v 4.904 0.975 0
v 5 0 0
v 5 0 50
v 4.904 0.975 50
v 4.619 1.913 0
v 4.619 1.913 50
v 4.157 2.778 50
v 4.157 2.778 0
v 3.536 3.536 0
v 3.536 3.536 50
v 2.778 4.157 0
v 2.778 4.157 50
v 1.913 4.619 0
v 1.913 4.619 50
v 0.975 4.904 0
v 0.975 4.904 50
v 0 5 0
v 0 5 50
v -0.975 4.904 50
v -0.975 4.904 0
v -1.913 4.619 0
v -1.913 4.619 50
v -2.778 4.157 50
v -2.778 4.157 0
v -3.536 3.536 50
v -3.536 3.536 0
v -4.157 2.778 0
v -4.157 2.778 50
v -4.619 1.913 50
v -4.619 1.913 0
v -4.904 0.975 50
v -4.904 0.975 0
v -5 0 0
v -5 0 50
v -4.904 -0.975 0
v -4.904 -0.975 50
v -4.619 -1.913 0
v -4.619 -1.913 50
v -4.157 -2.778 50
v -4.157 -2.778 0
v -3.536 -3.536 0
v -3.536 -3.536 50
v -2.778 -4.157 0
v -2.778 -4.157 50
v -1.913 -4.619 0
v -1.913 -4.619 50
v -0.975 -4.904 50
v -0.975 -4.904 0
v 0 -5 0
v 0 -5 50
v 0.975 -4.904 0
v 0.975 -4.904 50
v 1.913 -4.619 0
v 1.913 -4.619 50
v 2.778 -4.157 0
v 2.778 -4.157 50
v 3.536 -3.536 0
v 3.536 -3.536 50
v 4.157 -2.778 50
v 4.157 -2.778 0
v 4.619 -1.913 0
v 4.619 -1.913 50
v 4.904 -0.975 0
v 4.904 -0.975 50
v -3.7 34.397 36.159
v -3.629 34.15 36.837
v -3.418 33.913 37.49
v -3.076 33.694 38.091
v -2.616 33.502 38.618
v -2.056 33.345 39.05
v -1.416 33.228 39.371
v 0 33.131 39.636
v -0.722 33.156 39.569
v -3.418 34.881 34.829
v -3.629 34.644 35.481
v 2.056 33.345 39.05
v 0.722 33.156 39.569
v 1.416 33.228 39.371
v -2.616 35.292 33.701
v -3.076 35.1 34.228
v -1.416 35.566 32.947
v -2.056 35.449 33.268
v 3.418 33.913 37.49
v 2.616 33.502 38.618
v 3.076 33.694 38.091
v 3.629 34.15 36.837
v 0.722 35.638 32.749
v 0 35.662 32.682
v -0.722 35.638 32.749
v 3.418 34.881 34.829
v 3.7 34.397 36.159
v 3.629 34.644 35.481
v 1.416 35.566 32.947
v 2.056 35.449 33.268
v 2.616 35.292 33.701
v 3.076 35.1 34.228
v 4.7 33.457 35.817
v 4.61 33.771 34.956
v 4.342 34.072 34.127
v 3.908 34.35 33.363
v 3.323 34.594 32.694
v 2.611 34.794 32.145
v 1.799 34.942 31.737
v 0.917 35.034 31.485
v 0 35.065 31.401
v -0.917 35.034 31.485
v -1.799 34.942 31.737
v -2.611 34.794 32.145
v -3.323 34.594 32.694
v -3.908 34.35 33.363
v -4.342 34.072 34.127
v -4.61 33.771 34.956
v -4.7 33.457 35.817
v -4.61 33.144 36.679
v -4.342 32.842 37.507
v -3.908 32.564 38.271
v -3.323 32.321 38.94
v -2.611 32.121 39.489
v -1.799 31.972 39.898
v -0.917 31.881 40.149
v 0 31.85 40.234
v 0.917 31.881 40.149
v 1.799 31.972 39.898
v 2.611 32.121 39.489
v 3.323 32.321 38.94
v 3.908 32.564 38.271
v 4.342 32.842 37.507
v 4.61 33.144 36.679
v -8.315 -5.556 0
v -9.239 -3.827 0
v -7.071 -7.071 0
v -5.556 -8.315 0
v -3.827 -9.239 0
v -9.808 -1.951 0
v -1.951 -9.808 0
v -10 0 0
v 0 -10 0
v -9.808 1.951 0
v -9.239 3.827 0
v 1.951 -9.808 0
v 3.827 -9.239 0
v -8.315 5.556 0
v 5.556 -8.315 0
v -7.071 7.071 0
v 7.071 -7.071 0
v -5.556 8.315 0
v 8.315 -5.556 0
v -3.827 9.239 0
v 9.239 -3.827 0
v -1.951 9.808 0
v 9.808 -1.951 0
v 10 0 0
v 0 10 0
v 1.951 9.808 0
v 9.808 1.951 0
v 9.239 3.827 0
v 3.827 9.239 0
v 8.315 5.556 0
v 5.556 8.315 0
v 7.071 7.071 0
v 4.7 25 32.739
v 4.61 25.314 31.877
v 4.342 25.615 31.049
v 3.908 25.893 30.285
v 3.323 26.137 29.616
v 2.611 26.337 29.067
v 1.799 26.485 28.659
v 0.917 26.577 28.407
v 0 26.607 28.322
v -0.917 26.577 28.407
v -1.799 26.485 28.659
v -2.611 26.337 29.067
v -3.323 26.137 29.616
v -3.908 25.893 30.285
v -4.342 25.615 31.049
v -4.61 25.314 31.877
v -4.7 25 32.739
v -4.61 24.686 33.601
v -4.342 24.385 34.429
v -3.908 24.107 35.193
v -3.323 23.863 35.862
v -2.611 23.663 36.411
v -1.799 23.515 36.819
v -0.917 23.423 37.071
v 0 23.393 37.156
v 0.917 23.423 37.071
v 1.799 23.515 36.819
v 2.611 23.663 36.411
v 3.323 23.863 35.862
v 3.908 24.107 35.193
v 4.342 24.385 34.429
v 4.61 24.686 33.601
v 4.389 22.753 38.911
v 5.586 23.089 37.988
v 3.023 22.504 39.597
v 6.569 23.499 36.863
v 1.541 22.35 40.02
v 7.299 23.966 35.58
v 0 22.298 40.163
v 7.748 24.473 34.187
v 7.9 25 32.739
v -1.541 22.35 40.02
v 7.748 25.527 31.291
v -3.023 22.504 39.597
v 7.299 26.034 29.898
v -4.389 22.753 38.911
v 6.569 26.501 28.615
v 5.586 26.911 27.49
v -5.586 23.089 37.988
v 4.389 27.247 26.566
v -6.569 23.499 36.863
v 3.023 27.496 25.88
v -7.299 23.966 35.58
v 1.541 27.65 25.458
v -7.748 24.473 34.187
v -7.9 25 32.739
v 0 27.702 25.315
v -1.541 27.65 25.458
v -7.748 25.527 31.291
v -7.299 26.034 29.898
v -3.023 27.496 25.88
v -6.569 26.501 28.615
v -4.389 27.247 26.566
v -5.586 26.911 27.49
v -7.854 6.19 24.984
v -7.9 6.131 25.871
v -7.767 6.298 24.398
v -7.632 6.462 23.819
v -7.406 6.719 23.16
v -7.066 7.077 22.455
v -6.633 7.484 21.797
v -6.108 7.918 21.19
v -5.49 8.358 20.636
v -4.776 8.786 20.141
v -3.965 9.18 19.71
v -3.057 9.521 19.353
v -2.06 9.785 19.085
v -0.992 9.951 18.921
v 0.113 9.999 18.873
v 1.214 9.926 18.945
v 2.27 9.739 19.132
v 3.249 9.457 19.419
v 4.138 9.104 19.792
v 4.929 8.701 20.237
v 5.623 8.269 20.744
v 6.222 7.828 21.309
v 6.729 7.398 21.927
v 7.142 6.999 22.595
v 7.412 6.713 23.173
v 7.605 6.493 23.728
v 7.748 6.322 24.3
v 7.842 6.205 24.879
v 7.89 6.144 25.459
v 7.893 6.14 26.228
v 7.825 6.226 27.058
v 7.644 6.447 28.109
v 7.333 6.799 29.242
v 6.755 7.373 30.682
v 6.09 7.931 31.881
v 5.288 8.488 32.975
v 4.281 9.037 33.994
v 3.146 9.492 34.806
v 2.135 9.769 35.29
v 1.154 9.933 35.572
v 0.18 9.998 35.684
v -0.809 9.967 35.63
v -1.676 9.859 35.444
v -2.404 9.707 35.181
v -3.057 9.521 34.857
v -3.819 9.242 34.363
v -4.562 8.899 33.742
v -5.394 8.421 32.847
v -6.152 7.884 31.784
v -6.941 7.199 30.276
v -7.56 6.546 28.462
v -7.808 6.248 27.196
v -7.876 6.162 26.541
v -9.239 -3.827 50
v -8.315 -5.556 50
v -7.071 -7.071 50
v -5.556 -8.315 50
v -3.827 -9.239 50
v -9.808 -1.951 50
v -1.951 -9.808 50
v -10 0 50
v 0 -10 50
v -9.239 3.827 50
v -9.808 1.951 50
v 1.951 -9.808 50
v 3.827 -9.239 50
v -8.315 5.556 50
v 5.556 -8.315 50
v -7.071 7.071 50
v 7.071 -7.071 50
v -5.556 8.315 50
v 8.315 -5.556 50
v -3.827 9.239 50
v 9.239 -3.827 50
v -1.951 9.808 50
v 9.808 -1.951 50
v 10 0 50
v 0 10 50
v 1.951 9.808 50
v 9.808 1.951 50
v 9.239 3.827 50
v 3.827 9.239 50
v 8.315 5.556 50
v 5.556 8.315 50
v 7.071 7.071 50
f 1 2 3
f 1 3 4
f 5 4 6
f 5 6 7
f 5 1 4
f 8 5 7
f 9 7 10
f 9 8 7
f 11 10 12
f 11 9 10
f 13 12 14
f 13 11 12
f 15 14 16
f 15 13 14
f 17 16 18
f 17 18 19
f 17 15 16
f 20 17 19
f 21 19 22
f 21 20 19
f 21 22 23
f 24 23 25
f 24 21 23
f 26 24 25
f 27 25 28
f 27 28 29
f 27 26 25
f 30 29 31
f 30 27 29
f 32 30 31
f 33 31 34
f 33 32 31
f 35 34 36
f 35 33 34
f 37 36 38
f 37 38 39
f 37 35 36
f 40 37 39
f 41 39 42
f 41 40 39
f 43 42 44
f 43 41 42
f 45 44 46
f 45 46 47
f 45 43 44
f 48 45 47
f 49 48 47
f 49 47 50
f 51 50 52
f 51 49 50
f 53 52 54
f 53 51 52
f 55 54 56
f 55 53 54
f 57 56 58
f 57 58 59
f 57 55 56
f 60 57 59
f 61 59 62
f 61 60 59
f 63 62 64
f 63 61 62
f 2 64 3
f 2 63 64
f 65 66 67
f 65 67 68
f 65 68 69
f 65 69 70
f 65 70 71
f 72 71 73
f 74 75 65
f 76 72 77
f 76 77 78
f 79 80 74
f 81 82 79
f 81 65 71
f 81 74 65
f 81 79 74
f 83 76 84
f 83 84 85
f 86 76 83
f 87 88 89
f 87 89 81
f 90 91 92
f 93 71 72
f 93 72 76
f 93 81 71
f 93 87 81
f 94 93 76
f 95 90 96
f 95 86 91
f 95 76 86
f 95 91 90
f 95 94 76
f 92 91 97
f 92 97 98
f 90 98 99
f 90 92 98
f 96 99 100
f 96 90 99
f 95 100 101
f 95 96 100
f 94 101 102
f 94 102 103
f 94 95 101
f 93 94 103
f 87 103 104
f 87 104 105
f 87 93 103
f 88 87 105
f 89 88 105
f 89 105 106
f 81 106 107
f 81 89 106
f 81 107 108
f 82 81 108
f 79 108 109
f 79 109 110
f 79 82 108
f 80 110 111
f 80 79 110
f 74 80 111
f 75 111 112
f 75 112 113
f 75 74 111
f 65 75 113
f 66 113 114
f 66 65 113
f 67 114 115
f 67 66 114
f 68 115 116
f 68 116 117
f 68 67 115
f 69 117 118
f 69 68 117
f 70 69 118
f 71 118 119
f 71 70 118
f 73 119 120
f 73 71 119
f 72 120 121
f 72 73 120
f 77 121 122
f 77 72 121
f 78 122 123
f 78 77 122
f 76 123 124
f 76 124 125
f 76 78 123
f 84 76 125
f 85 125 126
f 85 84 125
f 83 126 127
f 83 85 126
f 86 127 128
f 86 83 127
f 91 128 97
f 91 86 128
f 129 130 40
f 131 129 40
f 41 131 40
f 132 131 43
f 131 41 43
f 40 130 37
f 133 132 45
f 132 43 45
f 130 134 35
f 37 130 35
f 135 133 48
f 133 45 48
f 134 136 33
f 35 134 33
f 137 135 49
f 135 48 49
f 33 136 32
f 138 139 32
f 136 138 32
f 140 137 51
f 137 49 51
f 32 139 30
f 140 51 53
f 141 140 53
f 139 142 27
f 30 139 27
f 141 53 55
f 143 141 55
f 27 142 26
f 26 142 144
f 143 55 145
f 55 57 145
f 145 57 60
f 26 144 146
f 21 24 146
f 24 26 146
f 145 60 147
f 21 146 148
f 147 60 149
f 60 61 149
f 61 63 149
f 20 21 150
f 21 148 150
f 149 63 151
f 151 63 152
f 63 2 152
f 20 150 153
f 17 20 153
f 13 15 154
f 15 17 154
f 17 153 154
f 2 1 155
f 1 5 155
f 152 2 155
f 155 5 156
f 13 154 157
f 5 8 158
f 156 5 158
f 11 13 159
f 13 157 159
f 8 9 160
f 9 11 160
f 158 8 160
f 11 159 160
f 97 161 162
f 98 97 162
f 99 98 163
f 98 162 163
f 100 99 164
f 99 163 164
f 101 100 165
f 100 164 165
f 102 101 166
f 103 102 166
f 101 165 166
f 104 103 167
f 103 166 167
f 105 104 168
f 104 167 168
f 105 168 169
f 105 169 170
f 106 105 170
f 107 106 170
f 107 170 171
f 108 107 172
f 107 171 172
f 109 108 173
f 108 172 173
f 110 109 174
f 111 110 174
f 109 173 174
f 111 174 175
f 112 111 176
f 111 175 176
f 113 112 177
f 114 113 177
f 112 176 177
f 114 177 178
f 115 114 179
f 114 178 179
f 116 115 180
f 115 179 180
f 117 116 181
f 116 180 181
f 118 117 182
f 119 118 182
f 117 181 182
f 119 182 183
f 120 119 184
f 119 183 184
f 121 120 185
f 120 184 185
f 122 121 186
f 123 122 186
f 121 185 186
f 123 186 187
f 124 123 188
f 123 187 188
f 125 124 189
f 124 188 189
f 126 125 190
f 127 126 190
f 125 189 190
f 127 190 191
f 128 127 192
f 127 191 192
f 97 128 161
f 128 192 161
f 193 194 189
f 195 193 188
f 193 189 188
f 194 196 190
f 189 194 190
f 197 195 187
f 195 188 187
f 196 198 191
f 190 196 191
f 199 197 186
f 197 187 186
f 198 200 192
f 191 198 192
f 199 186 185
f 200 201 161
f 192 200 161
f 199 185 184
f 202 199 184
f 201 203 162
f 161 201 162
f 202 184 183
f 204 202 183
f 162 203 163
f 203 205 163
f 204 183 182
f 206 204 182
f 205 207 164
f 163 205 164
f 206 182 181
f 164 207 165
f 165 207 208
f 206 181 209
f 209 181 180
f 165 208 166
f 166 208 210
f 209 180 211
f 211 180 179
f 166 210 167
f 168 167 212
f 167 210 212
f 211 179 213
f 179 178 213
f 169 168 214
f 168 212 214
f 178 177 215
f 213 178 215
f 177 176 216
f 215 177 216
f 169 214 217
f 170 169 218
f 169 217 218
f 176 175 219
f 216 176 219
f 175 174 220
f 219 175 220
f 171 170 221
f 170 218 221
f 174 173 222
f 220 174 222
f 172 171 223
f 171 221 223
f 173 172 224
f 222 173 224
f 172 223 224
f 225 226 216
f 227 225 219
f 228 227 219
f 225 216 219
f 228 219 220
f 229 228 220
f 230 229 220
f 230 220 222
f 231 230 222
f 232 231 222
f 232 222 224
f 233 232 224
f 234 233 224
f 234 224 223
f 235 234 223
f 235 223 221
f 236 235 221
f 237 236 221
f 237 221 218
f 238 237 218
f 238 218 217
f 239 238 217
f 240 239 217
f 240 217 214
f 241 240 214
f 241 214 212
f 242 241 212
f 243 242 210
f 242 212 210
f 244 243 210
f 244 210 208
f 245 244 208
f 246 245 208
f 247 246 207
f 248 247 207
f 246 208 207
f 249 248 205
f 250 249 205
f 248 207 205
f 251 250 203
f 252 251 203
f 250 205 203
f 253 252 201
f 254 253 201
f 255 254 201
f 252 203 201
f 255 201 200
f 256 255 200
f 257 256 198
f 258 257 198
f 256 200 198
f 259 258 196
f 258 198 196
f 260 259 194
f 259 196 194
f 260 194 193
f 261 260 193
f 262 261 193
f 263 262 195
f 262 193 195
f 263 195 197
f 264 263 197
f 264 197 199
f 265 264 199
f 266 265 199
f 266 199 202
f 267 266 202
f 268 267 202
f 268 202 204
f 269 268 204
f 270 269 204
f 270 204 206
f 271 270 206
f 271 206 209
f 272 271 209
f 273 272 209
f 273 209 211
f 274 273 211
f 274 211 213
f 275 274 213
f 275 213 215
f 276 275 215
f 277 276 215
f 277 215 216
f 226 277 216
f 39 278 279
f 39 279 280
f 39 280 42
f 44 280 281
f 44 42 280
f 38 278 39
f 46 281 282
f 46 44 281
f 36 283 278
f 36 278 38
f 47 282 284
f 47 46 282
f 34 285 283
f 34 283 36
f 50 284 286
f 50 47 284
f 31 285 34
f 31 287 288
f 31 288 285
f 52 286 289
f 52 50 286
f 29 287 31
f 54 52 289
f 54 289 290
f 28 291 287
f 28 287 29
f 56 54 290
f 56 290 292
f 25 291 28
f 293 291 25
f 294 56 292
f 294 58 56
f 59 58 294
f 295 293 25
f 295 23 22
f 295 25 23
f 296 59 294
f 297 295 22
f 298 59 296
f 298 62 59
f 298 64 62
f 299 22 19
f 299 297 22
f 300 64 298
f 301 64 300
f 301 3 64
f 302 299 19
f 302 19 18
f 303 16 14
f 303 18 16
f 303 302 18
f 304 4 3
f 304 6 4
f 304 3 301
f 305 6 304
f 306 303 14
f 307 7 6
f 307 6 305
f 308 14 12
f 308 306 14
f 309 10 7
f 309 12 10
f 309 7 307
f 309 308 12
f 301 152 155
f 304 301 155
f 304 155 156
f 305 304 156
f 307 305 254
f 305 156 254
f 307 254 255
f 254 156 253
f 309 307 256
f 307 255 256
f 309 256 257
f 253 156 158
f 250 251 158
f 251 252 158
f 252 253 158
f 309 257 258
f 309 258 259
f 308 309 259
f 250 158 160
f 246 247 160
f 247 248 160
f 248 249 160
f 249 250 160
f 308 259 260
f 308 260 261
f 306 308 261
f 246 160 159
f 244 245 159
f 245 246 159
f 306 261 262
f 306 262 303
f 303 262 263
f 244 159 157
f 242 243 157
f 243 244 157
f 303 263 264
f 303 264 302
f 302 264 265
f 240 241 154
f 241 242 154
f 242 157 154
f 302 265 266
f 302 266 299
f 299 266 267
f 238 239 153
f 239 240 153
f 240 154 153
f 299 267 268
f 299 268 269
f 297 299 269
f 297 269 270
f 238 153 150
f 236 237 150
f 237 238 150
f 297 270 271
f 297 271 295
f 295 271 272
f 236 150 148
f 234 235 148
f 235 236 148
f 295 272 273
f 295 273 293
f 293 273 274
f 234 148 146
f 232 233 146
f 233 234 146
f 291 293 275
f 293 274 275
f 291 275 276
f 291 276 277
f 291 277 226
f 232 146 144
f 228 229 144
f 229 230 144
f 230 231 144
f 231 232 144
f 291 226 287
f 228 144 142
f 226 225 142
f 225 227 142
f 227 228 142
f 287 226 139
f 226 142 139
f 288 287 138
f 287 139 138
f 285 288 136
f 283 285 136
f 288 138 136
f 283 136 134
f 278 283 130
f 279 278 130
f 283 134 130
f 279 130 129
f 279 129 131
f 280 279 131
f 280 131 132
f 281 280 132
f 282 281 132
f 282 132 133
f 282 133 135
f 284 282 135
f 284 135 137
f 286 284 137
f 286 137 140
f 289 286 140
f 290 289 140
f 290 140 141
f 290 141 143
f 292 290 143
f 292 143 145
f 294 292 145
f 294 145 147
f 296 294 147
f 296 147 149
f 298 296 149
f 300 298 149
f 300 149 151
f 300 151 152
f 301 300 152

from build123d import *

# Parameters (mm, degrees)
SKETCH1_R           = 10
SKETCH1_R_2         = 5
BOSS_EXTRUDE1_DEPTH = 50
BOSS_EXTRUDE2_REACH = 46.087
SKETCH4_R           = 7.9
SKETCH6_R           = 4.7
BOSS_EXTRUDE3_DEPTH = 10
CHAMFER1_SIZE       = 1


with BuildPart() as part:
    # Sketch1 → Boss-Extrude1 (new body)
    with BuildSketch(Plane.XY):
        Circle(SKETCH1_R)
        Circle(SKETCH1_R_2, mode=Mode.SUBTRACT)
    extrude(amount=BOSS_EXTRUDE1_DEPTH)

    # Sketch4 → Boss-Extrude2 (add, up to next)
    with BuildSketch(Plane(origin=(0, 25, 32.738958199), x_dir=(-1, 0, 0), z_dir=(0, -0.939692621, -0.342020143)), mode=Mode.PRIVATE) as boss_extrude2_sk1:
        Circle(SKETCH4_R)
    boss_extrude2_tool1 = extrude(boss_extrude2_sk1.sketch, amount=BOSS_EXTRUDE2_REACH, mode=Mode.PRIVATE) - part.part
    add(boss_extrude2_tool1.solids().sort_by_distance((0, 25, 32.738958))[0])

    # Sketch6 → Boss-Extrude3 (add)
    with BuildSketch(Plane(origin=(0, 32.597653881, 11.86457572), x_dir=(1, 0, 0), z_dir=(0, 0.939692621, 0.342020143))):
        with Locations((0, -22.214053849)):
            Circle(SKETCH6_R)
    extrude(amount=BOSS_EXTRUDE3_DEPTH)

    # Chamfer1
    chamfer1_edges = [part.edges().sort_by_distance(p)[0] for p in [
        (-4.7, 34.396926208, 36.159159633),
    ]]
    chamfer(chamfer1_edges, length=CHAMFER1_SIZE)


solid = part.part
